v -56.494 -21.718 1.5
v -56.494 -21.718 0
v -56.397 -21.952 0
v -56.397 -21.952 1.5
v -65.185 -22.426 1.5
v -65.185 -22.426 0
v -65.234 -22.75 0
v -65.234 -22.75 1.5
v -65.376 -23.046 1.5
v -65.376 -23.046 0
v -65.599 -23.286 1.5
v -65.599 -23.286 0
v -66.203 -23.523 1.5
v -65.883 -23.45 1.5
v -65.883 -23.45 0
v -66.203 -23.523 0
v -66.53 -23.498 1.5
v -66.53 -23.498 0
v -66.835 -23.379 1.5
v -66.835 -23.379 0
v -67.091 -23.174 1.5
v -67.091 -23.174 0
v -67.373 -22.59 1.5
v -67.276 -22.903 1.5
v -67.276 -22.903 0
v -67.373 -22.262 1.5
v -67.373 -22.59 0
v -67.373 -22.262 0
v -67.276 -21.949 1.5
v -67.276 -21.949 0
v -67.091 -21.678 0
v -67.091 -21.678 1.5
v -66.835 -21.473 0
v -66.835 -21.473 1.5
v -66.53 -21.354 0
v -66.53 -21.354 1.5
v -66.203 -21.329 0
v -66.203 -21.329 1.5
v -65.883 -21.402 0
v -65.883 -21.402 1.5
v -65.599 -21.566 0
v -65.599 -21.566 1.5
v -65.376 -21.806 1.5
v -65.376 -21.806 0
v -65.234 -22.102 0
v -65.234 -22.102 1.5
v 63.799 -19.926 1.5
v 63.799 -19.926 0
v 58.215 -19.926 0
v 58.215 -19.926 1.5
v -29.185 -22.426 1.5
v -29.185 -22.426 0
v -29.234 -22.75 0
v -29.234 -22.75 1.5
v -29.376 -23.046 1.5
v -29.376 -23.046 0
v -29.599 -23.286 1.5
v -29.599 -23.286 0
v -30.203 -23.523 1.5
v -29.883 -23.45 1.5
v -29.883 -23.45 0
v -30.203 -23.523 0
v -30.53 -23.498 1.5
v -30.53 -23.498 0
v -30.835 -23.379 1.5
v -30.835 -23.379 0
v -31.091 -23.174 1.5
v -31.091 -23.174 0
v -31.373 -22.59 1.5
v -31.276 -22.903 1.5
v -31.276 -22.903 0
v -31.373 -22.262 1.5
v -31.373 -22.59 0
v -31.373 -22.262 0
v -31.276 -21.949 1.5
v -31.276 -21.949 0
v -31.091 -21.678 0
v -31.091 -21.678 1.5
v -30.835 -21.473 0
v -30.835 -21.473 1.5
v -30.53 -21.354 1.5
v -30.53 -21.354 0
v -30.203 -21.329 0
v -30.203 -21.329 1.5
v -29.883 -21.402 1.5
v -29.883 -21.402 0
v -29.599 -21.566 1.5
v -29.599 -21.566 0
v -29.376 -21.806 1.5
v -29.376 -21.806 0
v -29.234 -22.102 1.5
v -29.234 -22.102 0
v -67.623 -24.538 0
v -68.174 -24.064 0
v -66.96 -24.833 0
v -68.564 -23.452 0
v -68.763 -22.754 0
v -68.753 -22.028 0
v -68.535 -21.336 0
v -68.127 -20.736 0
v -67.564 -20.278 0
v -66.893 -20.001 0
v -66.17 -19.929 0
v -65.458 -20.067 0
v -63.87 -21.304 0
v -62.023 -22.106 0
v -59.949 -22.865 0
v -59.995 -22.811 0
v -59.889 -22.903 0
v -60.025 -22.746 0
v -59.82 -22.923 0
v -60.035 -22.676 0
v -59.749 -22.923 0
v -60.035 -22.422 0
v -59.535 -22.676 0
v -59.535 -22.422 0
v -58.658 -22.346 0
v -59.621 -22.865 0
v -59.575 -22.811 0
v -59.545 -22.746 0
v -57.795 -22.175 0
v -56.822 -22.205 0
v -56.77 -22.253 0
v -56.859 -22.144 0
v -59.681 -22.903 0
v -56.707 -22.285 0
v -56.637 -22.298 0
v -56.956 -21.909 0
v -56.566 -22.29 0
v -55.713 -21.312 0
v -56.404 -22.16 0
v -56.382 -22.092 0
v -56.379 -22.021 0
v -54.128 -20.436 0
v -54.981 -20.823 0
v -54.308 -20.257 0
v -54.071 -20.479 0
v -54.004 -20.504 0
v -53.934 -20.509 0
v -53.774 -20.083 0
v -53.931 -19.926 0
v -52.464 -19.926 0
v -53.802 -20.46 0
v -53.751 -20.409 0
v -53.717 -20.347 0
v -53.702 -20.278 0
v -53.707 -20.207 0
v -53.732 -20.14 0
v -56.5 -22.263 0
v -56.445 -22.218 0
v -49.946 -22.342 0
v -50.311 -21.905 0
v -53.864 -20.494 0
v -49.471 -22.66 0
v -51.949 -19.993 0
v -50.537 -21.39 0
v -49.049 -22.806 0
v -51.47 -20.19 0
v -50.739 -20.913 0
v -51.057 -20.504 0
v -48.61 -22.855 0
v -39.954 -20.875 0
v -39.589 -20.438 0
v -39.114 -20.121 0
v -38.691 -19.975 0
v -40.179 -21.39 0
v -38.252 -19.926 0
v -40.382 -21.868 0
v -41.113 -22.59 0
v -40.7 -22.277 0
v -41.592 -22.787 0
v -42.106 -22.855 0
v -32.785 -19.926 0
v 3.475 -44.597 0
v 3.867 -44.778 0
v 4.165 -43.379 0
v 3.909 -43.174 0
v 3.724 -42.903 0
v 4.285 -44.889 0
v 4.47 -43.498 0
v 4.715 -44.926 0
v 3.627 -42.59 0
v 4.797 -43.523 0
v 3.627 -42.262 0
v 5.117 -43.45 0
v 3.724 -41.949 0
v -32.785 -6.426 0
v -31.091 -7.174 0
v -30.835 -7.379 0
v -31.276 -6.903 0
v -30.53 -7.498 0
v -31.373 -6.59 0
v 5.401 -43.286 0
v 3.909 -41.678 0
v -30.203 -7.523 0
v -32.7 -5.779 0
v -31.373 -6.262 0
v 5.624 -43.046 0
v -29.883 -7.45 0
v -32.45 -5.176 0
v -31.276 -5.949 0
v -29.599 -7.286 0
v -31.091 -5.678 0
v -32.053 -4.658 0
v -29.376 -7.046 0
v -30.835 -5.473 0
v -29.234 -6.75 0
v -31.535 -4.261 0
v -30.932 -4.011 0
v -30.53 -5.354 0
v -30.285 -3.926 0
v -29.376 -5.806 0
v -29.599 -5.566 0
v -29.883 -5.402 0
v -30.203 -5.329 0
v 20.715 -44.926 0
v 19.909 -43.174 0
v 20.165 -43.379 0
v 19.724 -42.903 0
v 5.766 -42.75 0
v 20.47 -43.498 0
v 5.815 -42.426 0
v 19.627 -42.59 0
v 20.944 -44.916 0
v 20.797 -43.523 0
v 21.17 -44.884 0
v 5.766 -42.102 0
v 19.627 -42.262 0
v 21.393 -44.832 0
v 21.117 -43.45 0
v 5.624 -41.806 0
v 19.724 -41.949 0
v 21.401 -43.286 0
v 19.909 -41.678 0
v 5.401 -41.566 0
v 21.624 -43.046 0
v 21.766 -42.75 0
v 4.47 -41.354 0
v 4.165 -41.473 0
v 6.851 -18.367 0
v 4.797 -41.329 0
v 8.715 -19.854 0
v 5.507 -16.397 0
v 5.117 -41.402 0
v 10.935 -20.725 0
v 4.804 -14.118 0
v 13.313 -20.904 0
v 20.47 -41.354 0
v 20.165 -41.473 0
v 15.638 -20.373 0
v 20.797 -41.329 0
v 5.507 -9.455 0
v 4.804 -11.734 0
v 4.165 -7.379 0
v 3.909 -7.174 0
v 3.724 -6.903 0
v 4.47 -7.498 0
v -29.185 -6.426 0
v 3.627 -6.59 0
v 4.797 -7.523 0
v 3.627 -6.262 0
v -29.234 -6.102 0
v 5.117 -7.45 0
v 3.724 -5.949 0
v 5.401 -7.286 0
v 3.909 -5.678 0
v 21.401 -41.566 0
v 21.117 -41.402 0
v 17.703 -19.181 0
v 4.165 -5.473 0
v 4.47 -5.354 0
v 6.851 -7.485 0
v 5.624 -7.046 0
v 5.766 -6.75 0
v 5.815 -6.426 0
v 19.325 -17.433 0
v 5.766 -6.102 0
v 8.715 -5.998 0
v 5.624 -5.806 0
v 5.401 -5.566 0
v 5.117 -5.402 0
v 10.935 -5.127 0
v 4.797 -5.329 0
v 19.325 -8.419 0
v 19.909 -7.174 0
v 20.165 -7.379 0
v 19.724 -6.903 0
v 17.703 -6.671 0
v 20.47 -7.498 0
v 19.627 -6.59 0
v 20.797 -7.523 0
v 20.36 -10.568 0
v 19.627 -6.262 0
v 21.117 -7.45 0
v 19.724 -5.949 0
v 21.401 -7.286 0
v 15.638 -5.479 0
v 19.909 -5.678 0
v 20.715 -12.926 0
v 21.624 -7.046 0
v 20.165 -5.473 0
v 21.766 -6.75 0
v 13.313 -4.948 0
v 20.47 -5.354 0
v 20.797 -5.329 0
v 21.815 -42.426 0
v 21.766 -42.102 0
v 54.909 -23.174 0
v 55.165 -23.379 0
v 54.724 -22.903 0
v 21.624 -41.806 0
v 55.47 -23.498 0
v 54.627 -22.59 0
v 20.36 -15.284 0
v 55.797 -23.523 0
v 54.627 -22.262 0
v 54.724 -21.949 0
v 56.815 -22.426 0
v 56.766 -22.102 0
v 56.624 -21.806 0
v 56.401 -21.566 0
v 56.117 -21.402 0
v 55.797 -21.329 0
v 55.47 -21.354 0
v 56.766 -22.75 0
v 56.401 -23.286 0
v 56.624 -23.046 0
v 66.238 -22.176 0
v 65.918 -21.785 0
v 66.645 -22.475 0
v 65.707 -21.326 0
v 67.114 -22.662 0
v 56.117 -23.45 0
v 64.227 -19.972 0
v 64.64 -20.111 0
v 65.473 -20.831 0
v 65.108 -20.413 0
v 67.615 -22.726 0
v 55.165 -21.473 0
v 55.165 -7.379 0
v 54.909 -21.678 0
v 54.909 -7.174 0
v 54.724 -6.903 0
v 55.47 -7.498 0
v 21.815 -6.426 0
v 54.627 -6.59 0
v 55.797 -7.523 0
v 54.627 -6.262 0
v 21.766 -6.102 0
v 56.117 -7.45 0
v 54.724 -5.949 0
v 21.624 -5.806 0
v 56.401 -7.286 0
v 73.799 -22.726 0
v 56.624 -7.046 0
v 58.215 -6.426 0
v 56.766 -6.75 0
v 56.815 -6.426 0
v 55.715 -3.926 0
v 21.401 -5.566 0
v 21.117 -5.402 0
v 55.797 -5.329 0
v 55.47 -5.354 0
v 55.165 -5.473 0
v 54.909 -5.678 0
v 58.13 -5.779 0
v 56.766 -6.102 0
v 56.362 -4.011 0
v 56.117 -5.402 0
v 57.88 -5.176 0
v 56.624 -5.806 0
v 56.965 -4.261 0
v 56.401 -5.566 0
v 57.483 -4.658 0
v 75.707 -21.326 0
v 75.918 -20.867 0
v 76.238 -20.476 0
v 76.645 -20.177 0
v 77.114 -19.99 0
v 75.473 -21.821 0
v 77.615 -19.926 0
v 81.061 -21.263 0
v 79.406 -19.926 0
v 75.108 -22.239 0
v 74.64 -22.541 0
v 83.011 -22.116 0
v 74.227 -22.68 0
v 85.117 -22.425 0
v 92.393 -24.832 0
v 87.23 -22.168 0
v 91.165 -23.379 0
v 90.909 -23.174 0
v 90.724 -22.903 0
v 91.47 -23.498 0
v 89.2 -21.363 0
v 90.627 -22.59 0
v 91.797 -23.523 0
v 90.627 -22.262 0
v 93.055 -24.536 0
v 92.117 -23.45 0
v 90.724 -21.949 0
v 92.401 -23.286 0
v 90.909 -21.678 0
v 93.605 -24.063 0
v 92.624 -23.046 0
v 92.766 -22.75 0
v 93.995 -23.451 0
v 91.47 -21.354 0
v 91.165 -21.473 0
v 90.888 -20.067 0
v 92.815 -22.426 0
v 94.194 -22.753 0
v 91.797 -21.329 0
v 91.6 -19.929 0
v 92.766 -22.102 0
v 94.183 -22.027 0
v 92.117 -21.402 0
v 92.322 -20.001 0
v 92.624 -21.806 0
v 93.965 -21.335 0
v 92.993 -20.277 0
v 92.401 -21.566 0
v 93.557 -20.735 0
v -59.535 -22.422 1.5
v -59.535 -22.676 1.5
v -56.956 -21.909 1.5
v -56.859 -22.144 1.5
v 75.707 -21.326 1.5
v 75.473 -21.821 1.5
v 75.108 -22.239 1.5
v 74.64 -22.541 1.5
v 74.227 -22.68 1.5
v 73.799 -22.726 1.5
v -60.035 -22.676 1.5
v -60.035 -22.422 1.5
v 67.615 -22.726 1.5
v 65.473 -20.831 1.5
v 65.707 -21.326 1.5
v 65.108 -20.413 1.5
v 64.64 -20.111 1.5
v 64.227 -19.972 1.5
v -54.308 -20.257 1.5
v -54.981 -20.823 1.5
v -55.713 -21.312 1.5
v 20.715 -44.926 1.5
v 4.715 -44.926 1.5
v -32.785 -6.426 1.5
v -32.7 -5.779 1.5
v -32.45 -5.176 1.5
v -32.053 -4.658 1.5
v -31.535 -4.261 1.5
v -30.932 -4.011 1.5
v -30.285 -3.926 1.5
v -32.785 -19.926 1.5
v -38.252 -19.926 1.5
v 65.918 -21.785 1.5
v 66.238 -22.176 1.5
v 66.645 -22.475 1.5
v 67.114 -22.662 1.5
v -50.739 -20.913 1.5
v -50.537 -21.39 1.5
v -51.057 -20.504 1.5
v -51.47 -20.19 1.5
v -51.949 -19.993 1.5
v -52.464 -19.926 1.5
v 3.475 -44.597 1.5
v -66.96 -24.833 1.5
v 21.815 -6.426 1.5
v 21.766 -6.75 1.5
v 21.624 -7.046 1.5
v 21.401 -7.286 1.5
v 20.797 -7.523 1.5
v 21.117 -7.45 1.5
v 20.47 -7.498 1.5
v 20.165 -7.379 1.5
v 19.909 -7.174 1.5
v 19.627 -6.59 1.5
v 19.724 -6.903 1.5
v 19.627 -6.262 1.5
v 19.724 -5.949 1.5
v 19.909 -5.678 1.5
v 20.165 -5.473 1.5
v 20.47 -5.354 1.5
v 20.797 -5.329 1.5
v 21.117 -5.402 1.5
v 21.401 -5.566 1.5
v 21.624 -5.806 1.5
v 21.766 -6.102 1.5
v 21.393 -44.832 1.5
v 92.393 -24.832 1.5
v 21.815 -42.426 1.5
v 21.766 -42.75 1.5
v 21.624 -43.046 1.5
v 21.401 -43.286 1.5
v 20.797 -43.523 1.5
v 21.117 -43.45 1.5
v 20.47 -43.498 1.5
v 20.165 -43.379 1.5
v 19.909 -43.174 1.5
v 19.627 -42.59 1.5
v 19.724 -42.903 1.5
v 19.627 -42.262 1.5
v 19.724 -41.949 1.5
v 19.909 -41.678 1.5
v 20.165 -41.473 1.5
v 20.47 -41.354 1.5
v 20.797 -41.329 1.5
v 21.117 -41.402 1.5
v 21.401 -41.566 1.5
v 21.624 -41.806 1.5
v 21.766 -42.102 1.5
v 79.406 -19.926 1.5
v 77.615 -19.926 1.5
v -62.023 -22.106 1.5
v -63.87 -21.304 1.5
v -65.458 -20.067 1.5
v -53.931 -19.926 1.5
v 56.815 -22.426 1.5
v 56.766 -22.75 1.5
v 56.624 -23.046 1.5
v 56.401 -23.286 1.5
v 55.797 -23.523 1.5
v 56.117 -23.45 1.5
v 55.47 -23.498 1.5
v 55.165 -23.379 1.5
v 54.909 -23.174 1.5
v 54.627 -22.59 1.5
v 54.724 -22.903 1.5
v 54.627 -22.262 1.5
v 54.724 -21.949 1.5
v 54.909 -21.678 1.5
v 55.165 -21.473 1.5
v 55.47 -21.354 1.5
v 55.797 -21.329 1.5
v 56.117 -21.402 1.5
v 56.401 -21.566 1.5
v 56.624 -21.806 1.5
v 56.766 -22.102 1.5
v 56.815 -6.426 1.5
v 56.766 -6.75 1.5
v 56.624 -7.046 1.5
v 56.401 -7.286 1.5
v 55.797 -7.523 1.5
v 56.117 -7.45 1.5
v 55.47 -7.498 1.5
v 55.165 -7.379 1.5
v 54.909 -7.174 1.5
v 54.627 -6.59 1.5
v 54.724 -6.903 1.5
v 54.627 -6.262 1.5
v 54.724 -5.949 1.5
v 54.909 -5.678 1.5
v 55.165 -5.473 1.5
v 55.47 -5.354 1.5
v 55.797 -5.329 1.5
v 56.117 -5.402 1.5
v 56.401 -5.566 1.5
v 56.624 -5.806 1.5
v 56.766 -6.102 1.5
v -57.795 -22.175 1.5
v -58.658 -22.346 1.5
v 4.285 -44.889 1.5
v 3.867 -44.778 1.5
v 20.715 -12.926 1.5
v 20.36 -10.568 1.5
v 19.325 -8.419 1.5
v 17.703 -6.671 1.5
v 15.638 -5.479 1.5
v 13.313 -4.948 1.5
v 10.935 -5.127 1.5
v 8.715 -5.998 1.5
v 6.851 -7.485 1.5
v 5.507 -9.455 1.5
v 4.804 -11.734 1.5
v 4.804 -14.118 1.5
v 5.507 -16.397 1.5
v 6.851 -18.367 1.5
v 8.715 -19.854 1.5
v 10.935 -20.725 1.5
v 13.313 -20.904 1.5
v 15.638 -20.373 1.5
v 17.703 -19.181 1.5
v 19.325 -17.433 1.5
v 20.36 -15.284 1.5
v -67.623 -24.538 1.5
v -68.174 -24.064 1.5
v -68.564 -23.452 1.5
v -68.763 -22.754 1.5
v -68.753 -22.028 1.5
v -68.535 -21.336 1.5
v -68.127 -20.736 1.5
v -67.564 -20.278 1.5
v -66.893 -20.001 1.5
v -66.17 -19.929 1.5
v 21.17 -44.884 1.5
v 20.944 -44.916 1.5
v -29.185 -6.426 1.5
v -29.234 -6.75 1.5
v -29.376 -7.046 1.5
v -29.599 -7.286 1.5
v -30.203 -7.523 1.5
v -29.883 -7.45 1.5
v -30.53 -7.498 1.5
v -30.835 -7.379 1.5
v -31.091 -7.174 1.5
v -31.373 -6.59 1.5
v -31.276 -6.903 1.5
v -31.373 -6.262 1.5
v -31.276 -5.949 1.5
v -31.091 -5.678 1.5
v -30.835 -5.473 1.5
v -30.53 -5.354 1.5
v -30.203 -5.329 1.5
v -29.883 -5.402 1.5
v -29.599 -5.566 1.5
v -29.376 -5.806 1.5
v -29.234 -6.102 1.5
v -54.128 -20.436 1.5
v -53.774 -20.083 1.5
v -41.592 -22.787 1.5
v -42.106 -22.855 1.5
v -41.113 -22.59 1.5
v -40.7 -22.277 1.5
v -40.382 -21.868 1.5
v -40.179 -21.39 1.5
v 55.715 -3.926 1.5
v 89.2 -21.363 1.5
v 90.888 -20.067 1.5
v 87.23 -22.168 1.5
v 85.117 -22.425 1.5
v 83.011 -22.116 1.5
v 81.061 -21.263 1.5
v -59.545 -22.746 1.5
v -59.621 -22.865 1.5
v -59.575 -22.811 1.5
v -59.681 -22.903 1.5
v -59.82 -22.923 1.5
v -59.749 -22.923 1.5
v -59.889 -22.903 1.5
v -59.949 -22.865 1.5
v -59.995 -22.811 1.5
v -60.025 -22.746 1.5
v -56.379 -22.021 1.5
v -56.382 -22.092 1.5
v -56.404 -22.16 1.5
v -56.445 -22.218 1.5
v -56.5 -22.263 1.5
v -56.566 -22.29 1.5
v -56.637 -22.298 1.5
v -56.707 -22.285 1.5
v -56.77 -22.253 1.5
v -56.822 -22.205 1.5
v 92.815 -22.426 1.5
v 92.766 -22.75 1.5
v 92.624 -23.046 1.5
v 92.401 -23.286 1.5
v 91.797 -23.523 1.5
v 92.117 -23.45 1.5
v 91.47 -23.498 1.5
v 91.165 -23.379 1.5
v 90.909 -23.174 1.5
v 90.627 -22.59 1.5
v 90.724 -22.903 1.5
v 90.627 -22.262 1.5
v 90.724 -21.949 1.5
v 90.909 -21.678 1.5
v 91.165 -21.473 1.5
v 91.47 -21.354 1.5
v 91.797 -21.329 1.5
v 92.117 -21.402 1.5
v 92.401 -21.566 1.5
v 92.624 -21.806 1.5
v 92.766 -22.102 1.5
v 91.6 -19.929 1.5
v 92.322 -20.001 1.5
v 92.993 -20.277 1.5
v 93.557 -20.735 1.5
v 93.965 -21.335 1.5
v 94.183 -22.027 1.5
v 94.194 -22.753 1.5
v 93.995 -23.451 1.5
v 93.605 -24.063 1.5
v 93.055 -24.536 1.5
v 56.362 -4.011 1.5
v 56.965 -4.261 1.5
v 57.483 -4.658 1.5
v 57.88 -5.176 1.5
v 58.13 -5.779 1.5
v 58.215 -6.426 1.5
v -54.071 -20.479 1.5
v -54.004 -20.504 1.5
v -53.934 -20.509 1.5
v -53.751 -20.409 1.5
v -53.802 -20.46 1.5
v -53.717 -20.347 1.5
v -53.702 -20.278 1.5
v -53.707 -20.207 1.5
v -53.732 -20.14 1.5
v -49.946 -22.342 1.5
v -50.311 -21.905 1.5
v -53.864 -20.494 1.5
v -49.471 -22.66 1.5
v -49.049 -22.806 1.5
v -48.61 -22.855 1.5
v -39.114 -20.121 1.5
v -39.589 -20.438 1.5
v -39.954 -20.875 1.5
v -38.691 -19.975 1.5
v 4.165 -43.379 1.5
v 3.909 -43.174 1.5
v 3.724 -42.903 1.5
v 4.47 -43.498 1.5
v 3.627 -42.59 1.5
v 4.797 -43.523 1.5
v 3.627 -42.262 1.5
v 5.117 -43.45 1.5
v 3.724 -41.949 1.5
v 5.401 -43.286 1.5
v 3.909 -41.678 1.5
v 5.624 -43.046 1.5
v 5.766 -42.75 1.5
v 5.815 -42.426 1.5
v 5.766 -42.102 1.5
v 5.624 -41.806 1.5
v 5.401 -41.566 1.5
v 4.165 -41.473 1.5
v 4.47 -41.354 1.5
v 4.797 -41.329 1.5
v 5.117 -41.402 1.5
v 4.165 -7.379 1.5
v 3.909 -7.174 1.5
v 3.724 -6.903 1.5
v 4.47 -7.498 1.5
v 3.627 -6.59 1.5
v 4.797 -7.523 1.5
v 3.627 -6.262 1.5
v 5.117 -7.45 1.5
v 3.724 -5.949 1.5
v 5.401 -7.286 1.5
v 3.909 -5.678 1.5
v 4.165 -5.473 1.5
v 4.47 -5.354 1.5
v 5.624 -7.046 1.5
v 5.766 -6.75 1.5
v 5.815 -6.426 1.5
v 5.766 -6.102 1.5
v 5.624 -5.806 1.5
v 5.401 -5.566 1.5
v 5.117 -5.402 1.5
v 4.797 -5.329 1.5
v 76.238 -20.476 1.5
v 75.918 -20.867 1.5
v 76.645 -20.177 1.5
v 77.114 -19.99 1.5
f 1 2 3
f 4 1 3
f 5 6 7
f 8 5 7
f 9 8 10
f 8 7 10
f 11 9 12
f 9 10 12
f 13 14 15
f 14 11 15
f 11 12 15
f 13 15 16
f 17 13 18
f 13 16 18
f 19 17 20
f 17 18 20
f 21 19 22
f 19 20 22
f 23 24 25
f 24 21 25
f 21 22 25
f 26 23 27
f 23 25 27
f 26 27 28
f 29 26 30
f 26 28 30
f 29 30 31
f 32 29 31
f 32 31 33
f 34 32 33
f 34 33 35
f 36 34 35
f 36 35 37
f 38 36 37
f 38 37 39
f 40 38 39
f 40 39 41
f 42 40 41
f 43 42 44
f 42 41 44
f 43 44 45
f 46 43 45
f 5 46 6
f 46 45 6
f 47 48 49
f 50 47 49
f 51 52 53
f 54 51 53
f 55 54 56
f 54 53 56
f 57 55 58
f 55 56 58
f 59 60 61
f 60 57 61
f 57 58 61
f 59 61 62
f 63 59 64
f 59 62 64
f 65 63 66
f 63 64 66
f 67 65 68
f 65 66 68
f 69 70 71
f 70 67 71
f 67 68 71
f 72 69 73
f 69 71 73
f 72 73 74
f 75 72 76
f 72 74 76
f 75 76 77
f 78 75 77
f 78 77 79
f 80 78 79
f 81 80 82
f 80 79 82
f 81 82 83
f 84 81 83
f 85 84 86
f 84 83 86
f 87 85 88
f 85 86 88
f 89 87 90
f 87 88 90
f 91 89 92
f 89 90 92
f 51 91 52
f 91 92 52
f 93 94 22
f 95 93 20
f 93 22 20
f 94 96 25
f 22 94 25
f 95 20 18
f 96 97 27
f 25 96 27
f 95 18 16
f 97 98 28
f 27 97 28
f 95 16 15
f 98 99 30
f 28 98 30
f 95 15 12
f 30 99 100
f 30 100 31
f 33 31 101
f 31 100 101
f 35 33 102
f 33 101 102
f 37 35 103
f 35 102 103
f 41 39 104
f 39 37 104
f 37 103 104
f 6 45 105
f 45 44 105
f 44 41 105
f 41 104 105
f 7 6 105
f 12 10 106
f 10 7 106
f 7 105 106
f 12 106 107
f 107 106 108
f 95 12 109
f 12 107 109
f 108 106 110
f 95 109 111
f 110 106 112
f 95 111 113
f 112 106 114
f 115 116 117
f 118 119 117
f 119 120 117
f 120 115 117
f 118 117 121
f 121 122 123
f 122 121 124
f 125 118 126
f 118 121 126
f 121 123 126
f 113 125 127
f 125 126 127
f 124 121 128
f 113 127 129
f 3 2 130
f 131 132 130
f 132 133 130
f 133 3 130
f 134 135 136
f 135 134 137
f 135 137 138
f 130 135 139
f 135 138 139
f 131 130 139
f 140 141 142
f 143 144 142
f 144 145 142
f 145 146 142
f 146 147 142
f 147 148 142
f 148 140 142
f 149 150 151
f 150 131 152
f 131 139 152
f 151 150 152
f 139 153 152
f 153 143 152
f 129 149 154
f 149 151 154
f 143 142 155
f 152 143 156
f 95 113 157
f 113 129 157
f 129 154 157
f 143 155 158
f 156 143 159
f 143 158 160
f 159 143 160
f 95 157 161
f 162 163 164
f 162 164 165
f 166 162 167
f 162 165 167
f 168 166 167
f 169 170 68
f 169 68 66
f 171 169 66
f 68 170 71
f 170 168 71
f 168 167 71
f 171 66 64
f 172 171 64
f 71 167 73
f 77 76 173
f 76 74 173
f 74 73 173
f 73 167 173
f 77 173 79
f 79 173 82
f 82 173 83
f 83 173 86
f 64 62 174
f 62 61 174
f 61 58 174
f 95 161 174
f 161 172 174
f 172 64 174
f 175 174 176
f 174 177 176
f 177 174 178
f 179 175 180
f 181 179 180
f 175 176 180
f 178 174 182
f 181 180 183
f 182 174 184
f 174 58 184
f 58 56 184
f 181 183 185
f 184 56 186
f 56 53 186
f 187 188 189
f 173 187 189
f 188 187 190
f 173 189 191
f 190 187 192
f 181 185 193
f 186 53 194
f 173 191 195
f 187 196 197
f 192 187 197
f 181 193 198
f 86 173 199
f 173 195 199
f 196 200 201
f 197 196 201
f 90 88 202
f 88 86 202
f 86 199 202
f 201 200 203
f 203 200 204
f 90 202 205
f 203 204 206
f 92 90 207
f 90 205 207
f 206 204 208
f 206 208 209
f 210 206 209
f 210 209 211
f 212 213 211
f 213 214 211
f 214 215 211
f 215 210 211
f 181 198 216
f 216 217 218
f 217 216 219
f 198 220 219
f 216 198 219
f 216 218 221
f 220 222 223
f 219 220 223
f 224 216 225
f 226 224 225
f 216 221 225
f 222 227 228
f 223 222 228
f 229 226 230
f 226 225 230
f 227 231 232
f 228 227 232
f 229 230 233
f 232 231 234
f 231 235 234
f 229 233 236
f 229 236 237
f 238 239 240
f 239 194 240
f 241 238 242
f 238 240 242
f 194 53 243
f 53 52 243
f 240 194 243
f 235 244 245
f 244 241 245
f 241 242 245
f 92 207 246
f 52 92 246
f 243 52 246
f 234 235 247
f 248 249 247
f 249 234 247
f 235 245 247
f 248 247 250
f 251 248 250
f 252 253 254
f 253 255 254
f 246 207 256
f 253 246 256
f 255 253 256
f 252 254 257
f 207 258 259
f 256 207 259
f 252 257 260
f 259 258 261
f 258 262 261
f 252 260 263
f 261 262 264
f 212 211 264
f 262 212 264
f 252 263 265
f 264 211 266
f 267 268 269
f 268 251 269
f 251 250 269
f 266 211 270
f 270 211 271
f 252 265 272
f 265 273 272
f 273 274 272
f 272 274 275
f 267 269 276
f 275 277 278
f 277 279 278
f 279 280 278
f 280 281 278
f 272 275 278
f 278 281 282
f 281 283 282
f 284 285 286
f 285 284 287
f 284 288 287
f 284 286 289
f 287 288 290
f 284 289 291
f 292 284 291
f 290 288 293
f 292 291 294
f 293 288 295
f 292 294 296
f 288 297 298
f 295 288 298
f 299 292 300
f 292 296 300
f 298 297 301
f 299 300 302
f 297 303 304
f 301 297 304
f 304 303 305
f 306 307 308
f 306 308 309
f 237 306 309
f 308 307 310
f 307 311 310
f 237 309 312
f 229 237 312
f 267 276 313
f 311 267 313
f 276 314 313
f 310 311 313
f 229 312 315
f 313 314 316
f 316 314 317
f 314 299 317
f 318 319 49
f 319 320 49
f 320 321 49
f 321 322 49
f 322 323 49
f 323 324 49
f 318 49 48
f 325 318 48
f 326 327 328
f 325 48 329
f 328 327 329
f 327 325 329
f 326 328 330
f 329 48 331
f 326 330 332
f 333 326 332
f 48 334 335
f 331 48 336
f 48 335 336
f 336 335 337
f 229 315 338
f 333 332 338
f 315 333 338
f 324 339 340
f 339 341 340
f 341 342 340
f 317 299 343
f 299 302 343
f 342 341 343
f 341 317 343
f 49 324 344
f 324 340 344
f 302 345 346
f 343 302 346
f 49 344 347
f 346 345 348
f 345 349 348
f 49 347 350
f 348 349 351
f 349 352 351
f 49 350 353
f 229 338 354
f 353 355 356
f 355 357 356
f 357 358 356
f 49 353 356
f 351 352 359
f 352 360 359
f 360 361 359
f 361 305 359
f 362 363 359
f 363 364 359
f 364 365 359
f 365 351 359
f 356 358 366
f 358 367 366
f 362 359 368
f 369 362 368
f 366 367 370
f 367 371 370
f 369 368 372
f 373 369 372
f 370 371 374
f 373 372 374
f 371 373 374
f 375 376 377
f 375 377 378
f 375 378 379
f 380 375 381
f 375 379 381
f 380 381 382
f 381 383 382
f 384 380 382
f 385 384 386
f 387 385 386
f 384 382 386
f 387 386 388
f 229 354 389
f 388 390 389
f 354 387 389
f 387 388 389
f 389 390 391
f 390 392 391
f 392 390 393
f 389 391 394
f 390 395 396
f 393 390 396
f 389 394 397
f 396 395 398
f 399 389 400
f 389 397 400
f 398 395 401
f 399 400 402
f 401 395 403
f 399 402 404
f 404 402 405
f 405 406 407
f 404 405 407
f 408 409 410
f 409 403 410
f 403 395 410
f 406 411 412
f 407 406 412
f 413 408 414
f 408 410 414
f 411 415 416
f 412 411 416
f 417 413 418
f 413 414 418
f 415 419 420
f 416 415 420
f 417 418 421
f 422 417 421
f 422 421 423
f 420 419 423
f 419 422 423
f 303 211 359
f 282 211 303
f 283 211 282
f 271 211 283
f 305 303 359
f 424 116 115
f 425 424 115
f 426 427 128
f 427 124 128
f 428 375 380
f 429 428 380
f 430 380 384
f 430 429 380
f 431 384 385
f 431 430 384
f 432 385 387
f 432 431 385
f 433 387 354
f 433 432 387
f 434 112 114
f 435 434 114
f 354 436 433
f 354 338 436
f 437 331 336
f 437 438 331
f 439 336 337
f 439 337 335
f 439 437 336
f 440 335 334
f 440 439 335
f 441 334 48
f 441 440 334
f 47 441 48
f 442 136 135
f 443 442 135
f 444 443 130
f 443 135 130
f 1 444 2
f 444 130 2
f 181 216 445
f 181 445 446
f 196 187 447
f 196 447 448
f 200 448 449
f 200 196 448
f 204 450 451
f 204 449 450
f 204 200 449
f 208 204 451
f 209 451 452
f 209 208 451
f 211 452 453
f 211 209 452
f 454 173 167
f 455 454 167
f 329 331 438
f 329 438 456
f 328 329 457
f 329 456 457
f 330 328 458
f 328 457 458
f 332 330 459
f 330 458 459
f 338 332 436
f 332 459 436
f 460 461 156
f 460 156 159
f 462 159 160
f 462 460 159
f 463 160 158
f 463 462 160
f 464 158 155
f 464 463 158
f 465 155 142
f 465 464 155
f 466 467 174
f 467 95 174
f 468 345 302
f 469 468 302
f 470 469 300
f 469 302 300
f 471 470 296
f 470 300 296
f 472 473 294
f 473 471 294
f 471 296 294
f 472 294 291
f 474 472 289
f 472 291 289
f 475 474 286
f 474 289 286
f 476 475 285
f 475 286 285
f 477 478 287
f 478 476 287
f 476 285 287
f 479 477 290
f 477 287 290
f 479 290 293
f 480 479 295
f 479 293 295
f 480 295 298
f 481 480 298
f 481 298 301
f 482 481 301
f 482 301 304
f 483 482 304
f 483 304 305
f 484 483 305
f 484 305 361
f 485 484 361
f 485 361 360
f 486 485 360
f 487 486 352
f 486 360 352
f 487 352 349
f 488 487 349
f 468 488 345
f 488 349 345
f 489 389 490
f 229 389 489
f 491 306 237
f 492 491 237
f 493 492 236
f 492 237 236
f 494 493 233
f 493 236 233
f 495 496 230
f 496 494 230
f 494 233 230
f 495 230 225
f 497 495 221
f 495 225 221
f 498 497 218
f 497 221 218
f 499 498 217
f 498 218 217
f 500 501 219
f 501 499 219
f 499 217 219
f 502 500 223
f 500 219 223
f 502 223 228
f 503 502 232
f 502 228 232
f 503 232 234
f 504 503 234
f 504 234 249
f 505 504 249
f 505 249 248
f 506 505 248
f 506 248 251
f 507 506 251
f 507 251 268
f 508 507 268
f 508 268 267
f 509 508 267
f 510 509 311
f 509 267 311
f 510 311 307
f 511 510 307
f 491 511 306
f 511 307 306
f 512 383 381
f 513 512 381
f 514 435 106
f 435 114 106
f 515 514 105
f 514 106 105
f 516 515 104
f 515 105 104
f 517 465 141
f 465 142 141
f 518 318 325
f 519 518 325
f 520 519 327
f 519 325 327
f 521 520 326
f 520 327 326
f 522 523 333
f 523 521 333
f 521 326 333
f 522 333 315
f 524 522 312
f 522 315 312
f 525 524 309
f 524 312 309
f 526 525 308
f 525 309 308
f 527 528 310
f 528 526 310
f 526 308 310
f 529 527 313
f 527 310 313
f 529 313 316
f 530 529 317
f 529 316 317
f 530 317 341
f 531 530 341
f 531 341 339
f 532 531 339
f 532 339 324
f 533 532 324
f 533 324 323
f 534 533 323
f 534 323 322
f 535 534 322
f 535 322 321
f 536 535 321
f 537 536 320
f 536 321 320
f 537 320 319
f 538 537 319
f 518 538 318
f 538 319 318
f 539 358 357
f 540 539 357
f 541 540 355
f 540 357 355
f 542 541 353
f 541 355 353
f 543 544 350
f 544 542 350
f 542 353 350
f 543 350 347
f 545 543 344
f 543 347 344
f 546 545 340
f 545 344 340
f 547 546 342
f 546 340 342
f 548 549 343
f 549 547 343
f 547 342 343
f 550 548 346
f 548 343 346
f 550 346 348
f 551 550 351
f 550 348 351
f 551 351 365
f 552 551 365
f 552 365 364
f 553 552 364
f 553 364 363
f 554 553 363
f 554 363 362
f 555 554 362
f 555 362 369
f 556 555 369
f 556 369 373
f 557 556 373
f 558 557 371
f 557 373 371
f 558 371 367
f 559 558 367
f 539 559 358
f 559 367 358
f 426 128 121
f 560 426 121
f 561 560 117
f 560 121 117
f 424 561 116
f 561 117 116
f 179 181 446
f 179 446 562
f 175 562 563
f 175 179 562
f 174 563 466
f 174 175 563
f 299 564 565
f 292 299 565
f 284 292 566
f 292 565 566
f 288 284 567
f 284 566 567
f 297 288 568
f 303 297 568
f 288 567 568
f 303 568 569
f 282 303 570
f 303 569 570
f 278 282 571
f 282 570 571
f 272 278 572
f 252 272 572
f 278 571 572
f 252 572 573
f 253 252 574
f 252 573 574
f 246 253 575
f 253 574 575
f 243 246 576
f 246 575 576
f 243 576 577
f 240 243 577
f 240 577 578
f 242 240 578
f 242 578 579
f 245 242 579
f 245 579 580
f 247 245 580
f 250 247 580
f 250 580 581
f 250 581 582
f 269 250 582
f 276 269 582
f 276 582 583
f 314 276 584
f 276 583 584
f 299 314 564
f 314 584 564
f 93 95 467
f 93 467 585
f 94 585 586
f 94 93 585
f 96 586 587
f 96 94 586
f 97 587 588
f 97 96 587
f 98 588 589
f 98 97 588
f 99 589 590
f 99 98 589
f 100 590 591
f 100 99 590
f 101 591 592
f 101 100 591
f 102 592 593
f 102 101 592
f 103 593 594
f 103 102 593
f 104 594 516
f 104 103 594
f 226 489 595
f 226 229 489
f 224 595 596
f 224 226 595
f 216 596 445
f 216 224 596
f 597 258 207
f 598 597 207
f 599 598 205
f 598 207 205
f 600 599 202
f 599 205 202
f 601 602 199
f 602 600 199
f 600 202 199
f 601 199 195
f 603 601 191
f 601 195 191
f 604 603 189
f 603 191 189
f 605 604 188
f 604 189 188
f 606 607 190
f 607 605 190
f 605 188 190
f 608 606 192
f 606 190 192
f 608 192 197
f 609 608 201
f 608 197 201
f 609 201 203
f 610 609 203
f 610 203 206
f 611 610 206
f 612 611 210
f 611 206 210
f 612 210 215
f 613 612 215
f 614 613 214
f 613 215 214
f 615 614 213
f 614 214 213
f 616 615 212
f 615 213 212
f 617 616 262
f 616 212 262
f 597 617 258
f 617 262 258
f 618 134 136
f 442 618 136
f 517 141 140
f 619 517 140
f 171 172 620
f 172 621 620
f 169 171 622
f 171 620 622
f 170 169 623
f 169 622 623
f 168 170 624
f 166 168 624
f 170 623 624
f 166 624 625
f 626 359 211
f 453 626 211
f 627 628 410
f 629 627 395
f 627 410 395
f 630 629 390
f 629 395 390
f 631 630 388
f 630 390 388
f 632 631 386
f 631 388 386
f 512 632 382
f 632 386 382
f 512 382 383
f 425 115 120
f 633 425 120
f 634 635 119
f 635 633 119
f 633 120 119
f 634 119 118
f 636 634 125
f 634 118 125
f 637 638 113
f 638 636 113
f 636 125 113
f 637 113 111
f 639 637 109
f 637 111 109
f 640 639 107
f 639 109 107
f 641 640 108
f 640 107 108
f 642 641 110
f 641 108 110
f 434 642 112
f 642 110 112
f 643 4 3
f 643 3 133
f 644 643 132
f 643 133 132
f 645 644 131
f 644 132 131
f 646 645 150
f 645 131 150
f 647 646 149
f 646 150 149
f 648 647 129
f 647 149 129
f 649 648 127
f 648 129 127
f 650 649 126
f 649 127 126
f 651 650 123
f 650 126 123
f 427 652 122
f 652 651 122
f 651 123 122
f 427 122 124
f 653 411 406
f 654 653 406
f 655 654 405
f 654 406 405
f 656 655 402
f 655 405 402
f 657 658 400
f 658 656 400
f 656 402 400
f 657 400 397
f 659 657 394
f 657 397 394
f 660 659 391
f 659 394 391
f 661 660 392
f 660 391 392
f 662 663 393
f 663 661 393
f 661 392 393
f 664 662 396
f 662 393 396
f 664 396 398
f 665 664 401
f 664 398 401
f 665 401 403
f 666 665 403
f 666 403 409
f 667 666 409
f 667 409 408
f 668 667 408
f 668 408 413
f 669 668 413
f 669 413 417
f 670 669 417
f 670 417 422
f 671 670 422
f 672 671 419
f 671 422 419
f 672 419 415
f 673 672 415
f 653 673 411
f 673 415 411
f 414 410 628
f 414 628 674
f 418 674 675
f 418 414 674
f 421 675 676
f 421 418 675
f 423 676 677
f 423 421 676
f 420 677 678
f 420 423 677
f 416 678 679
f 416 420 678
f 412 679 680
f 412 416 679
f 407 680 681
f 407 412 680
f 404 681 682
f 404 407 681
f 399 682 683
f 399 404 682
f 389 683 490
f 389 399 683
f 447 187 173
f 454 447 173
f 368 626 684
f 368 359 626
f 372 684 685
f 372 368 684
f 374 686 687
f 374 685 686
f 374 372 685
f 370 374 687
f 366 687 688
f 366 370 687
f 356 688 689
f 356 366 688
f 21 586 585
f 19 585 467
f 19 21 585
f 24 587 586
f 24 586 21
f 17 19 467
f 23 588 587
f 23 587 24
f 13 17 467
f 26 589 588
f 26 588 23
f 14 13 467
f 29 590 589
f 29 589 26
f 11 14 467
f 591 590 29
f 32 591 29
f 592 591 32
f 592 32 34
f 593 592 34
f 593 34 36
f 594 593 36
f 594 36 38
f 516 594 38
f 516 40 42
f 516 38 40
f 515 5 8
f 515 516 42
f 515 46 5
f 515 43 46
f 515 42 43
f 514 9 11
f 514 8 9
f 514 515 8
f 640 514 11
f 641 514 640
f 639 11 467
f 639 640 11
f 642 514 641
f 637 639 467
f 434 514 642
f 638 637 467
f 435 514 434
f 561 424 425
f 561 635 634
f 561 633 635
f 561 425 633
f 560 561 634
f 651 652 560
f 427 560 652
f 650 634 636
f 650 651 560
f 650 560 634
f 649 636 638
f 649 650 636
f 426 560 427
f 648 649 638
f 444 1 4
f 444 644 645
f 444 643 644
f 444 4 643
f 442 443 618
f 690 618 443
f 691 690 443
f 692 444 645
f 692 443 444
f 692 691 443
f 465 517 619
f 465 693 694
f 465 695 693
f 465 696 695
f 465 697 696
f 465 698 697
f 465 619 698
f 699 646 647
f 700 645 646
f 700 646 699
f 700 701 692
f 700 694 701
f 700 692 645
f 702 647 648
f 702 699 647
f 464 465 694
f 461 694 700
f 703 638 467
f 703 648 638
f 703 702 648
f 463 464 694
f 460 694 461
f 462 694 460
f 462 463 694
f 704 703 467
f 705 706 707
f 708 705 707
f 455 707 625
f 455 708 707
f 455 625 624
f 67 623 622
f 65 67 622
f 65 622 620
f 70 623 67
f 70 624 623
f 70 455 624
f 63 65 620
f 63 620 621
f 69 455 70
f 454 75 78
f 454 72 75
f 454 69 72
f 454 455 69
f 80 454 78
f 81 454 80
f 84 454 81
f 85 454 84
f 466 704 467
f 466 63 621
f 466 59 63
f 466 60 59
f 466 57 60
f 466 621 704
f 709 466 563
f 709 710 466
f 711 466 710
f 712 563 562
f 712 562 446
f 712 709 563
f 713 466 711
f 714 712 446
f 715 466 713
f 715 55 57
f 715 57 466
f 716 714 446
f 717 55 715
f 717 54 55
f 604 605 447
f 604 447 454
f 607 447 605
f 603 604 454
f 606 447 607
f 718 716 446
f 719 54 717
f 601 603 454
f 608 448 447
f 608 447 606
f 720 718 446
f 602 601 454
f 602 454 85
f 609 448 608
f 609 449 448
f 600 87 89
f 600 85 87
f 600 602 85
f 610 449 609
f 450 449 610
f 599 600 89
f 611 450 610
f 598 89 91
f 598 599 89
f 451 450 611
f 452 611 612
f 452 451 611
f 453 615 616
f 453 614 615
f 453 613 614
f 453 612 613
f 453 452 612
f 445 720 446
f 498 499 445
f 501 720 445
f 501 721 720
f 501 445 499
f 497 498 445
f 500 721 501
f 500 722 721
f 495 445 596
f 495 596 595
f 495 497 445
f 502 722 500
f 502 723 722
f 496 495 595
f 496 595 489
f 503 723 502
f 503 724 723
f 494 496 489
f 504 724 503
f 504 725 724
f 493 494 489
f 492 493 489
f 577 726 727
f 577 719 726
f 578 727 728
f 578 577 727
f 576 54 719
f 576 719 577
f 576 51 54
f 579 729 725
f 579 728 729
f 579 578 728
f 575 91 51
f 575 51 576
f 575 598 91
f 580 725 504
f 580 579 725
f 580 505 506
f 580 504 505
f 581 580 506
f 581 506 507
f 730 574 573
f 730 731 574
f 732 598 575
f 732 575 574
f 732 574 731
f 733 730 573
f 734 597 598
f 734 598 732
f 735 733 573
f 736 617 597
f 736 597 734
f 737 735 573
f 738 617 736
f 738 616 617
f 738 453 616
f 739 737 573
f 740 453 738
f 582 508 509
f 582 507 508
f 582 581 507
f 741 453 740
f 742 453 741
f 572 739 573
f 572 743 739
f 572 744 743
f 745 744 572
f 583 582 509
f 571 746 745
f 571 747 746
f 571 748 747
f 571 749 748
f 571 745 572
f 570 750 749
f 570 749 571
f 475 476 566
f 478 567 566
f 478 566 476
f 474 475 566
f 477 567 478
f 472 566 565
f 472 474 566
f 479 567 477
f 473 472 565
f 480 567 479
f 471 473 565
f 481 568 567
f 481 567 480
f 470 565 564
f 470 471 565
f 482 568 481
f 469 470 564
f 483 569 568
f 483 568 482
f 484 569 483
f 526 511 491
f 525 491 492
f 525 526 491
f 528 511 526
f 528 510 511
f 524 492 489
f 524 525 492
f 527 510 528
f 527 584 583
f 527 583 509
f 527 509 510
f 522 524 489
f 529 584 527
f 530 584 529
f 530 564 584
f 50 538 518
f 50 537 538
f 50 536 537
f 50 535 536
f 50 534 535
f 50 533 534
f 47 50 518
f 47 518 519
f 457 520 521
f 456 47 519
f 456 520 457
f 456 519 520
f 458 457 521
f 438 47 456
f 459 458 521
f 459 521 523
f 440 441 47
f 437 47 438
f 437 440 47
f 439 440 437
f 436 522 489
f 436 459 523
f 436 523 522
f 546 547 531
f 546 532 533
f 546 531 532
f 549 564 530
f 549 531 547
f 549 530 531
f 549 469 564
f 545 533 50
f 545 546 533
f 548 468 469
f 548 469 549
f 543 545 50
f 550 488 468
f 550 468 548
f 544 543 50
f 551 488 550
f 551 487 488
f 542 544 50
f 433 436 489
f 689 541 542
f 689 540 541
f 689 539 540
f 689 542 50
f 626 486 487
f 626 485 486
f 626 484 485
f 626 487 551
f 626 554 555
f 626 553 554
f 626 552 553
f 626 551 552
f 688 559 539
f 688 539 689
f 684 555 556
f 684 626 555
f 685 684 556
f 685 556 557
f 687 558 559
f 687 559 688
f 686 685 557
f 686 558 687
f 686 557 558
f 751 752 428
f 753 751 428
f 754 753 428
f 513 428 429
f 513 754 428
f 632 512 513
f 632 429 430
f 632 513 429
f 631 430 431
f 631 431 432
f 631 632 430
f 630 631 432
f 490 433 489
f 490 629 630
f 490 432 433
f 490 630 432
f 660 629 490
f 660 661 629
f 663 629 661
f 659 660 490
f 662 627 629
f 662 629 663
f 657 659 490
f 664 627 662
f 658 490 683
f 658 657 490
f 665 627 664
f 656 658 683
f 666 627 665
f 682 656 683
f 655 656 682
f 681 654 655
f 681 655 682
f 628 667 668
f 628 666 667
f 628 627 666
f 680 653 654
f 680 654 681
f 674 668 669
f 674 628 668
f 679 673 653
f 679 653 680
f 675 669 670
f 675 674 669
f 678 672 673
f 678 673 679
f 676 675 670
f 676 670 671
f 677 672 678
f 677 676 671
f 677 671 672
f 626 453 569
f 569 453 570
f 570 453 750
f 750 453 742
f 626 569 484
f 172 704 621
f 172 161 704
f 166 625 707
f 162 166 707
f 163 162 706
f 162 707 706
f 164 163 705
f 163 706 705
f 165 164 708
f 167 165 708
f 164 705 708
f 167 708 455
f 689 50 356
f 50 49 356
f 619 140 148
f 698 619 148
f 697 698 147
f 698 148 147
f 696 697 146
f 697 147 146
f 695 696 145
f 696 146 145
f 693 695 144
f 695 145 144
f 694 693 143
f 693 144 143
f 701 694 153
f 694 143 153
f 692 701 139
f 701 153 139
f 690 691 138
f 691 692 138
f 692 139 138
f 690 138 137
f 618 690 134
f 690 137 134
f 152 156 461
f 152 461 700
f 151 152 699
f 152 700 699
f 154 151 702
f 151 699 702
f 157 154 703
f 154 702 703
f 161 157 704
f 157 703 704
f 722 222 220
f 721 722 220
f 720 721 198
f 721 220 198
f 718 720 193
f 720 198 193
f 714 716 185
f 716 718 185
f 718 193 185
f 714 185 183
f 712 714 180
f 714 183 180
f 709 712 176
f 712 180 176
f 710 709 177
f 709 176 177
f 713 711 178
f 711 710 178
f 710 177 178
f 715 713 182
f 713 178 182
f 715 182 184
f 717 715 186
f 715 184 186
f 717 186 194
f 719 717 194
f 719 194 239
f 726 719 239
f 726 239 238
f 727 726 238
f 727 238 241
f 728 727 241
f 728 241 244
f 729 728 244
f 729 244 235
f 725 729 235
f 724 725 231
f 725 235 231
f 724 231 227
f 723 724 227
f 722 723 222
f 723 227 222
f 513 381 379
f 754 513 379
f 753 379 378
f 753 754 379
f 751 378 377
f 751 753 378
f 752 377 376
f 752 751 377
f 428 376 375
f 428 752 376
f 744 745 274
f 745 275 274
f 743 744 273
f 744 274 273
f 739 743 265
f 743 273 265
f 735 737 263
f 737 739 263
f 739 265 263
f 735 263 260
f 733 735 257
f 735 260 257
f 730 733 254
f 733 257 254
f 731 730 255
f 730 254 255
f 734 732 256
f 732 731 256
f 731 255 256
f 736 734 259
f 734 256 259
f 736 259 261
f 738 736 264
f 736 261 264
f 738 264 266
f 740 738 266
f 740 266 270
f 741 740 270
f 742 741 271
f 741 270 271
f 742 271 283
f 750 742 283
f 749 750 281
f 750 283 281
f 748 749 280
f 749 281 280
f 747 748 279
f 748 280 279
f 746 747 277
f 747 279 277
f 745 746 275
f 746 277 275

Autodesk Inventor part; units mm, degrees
ref_plane "YZ Plane" through (0, 0, 0) normal (1, 0, 0) x (0, 1, 0)
ref_plane "XZ Plane" through (0, 0, 0) normal (0, 1, 0) x (-1, 0, 0)
ref_plane "XY Plane" through (0, 0, 0) normal (0, 0, 1) x (1, 0, 0)
sketch "スケッチ1" plane through (0, 0, 0) normal (0, 0, 1) x (1, 0, 0)
  circle A0 centre (55.7151, -22.426) radius 1 projected
  circle A1 centre (55.7151, -6.426) radius 1.05 projected
  circle A2 centre (20.7151, -6.426) radius 1 projected
  circle A3 centre (4.7151, -6.426) radius 1.45 projected
  circle A4 centre (-30.2849, -22.426) radius 1 projected
  circle A5 centre (-30.2849, -6.426) radius 1.05 projected
  circle A6 centre (55.7151, -22.426) radius 1.1
  circle A7 centre (55.7151, -6.426) radius 1.1
  circle A8 centre (20.7151, -6.426) radius 1.1
  circle A9 centre (4.7151, -6.426) radius 1.1
  circle A10 centre (-30.2849, -6.426) radius 1.1
  circle A11 centre (-30.2849, -22.426) radius 1.1
  circle A12 centre (20.7151, -42.426) radius 1 projected
  circle A13 centre (4.7151, -42.426) radius 1 projected
  circle A14 centre (20.7151, -42.426) radius 1.1
  circle A15 centre (4.7151, -42.426) radius 1.1
  circle A16 centre (55.7151, -6.426) radius 2.5
  circle A17 centre (-30.2849, -6.426) radius 2.5
  circle A18 centre (-30.2849, -22.426) radius 2.5
  circle A19 centre (55.7151, -22.426) radius 2.5
  circle A20 centre (20.7151, -42.426) radius 2.5
  circle A21 centre (4.7151, -42.426) radius 2.5
  line L0 (21.9554, -44.5966) -> (56.9554, -24.5966)
  line L1 (58.2151, -22.426) -> (58.2151, -6.426)
  line L2 (55.7151, -3.926) -> (-30.2849, -3.926)
  line L3 (-32.7849, -6.426) -> (-32.7849, -22.426)
  line L4 (3.4747, -44.5966) -> (-31.5253, -24.5966)
  line L5 (20.7151, -44.926) -> (4.7151, -44.926)
  circle A22 centre (91.7151, -22.426) radius 1 projected
  circle A23 centre (91.7151, -22.426) radius 1.1
  circle A24 centre (-66.2849, -22.426) radius 1.05 projected
  circle A25 centre (-66.2849, -22.426) radius 1.1
  circle A26 centre (-66.2849, -22.426) radius 2.5
  circle A27 centre (91.7151, -22.426) radius 2.5
  line L6 (92.3929, -24.8324) -> (21.3929, -44.8324)
  line L7 (91.7151, -19.926) -> (55.7151, -19.926)
  line L8 (73.8937, -20.8546) -> (67.5365, -20.8546) projected
  line L9 (73.8937, -16.9974) -> (73.8937, -20.8546) projected
  line L10 (67.5365, -16.9974) -> (73.8937, -16.9974) projected
  line L11 (67.5365, -20.8546) -> (67.5365, -16.9974) projected
  line L12 (73.8937, -20.8546) -> (67.5365, -20.8546) projected
  line L13 (67.6151, -17.226) -> (73.6151, -17.226) projected
  line L14 (73.6151, -17.226) -> (73.6151, -20.726) projected
  line L15 (73.6151, -20.726) -> (67.6151, -20.726) projected
  line L16 (67.6151, -20.726) -> (67.6151, -17.226) projected
  line L17 (65.6151, -22.726) -> (75.6151, -22.726)
  line L18 (75.6151, -22.726) -> (75.6151, -15.226)
  line L19 (75.6151, -15.226) -> (65.6151, -15.226)
  line L20 (65.6151, -15.226) -> (65.6151, -22.726)
  line L21 (-66.9603, -24.833) -> (3.4747, -44.5966)
  line L22 (-30.2849, -19.926) -> (-66.2849, -19.926)
  line L23 (-48.4635, -20.8546) -> (-48.4635, -16.9974) projected
  line L24 (-28.7849, -24.426) -> (-67.7849, -24.426) projected
  arc A28 (-28.7849, -24.426) -> (-28.2849, -23.926) centre (-28.7849, -23.926) ccw projected
  line L25 (-28.2849, -4.926) -> (-28.2849, -23.926) projected
  arc A29 (-28.2849, -4.926) -> (-28.7849, -4.426) centre (-28.7849, -4.926) ccw projected
  line L26 (-67.7849, -4.426) -> (-28.7849, -4.426) projected
  arc A30 (-67.7849, -4.426) -> (-68.2849, -4.926) centre (-67.7849, -4.926) ccw projected
  line L27 (-68.2849, -23.926) -> (-68.2849, -4.926) projected
  arc A31 (-68.2849, -23.926) -> (-67.7849, -24.426) centre (-67.7849, -23.926) ccw projected
  line L28 (-48.4635, -7.9974) -> (-42.1063, -7.9974) projected
  line L29 (-42.1063, -7.9974) -> (-42.1063, -11.8546) projected
  line L30 (-42.1063, -11.8546) -> (-48.4635, -11.8546) projected
  line L31 (-48.4635, -11.8546) -> (-48.4635, -7.9974) projected
  circle A32 centre (-40.8849, -14.426) radius 1.1519 projected
  line L32 (-48.4635, -20.8546) -> (-48.4635, -16.9974) projected
  line L33 (-48.4635, -16.9974) -> (-42.1063, -16.9974) projected
  line L34 (-42.1063, -16.9974) -> (-42.1063, -20.8546) projected
  line L35 (-42.1063, -20.8546) -> (-48.4635, -20.8546) projected
  circle A33 centre (-66.2849, -6.426) radius 1.8131 projected
  circle A34 centre (-66.2849, -22.426) radius 1.8131 projected
  circle A35 centre (-30.2849, -6.426) radius 1.8131 projected
  circle A36 centre (-30.2849, -22.426) radius 1.8131 projected
  arc A37 (-59.7956, -8.176) -> (-59.7849, -20.676) centre (-59.7849, -14.426) ccw projected
  arc A38 (-60.0349, -7.926) -> (-59.7956, -8.1758) centre (-59.7849, -7.926) ccw projected
  line L36 (-60.0349, -7.926) -> (-60.0349, -6.176) projected
  arc A39 (-59.5349, -6.176) -> (-60.0349, -6.176) centre (-59.7849, -6.176) ccw projected
  line L37 (-59.5349, -6.176) -> (-59.5349, -7.926) projected
  arc A40 (-59.7849, -8.176) -> (-59.5349, -7.926) centre (-59.7849, -7.926) ccw projected
  arc A41 (-57.3931, -8.6518) -> (-59.7849, -8.176) centre (-59.7849, -14.426) ccw projected
  arc A42 (-57.5284, -8.3251) -> (-57.3931, -8.6518) centre (-57.2975, -8.4208) ccw projected
  line L38 (-57.5284, -8.3251) -> (-56.8587, -6.7083) projected
  arc A43 (-56.3968, -6.8997) -> (-56.8587, -6.7083) centre (-56.6278, -6.804) ccw projected
  line L39 (-56.3968, -6.8997) -> (-57.0665, -8.5165) projected
  arc A44 (-57.3931, -8.6518) -> (-57.0665, -8.5165) centre (-57.2975, -8.4208) ccw projected
  arc A45 (-55.3655, -10.0066) -> (-57.3931, -8.6518) centre (-59.7849, -14.426) ccw projected
  arc A46 (-55.3655, -9.653) -> (-55.3655, -10.0066) centre (-55.1887, -9.8298) ccw projected
  line L40 (-55.3655, -9.653) -> (-54.1281, -8.4156) projected
  arc A47 (-53.7745, -8.7692) -> (-54.1281, -8.4156) centre (-53.9513, -8.5924) ccw projected
  line L41 (-53.7745, -8.7692) -> (-55.0119, -10.0066) projected
  arc A48 (-55.3655, -10.0066) -> (-55.0119, -10.0066) centre (-55.1887, -9.8298) ccw projected
  arc A49 (-54.0107, -12.0342) -> (-55.3655, -10.0066) centre (-59.7849, -14.426) ccw projected
  arc A50 (-53.8754, -11.7076) -> (-54.0107, -12.0342) centre (-53.7797, -11.9386) ccw projected
  line L42 (-53.8754, -11.7076) -> (-52.2586, -11.0379) projected
  arc A51 (-52.0672, -11.4998) -> (-52.2586, -11.0379) centre (-52.1629, -11.2689) ccw projected
  line L43 (-52.0672, -11.4998) -> (-53.684, -12.1695) projected
  arc A52 (-54.0107, -12.0342) -> (-53.684, -12.1695) centre (-53.7797, -11.9386) ccw projected
  arc A53 (-53.5349, -14.426) -> (-54.0107, -12.0342) centre (-59.7849, -14.426) ccw projected
  arc A54 (-53.2849, -14.176) -> (-53.5349, -14.426) centre (-53.2849, -14.426) ccw projected
  line L44 (-53.2849, -14.176) -> (-51.5349, -14.176) projected
  arc A55 (-51.5349, -14.676) -> (-51.5349, -14.176) centre (-51.5349, -14.426) ccw projected
  line L45 (-51.5349, -14.676) -> (-53.2849, -14.676) projected
  arc A56 (-53.5349, -14.426) -> (-53.2849, -14.676) centre (-53.2849, -14.426) ccw projected
  arc A57 (-54.0107, -16.8178) -> (-53.5349, -14.426) centre (-59.7849, -14.426) ccw projected
  arc A58 (-53.684, -16.6825) -> (-54.0107, -16.8178) centre (-53.7797, -16.9134) ccw projected
  line L46 (-53.684, -16.6825) -> (-52.0672, -17.3522) projected
  arc A59 (-52.2586, -17.8141) -> (-52.0672, -17.3522) centre (-52.1629, -17.5831) ccw projected
  line L47 (-52.2586, -17.8141) -> (-53.8754, -17.1444) projected
  arc A60 (-54.0107, -16.8178) -> (-53.8754, -17.1444) centre (-53.7797, -16.9134) ccw projected
  arc A61 (-55.3655, -18.8454) -> (-54.0107, -16.8178) centre (-59.7849, -14.426) ccw projected
  arc A62 (-55.0119, -18.8454) -> (-55.3655, -18.8454) centre (-55.1887, -19.0222) ccw projected
  line L48 (-55.0119, -18.8454) -> (-53.7745, -20.0829) projected
  arc A63 (-54.1281, -20.4364) -> (-53.7745, -20.0829) centre (-53.9513, -20.2596) ccw projected
  line L49 (-54.1281, -20.4364) -> (-55.3655, -19.199) projected
  arc A64 (-55.3655, -18.8454) -> (-55.3655, -19.199) centre (-55.1887, -19.0222) ccw projected
  arc A65 (-57.3931, -20.2003) -> (-55.3655, -18.8454) centre (-59.7849, -14.426) ccw projected
  arc A66 (-57.0665, -20.3356) -> (-57.3931, -20.2003) centre (-57.2975, -20.4312) ccw projected
  line L50 (-57.0665, -20.3356) -> (-56.3968, -21.9523) projected
  arc A67 (-56.8587, -22.1437) -> (-56.3968, -21.9523) centre (-56.6278, -22.048) ccw projected
  line L51 (-56.8587, -22.1437) -> (-57.5284, -20.5269) projected
  arc A68 (-57.3931, -20.2003) -> (-57.5284, -20.5269) centre (-57.2975, -20.4312) ccw projected
  arc A69 (-59.7849, -20.676) -> (-57.3931, -20.2003) centre (-59.7849, -14.426) ccw projected
  arc A70 (-59.5349, -20.926) -> (-59.7849, -20.676) centre (-59.7849, -20.926) ccw projected
  line L52 (-59.5349, -20.926) -> (-59.5349, -22.676) projected
  arc A71 (-60.0349, -22.676) -> (-59.5349, -22.676) centre (-59.7849, -22.676) ccw projected
  line L53 (-60.0349, -22.676) -> (-60.0349, -20.926) projected
  arc A72 (-59.7849, -20.676) -> (-60.0349, -20.926) centre (-59.7849, -20.926) ccw projected
  line L54 (-50.4635, -22.8546) -> (-40.1063, -22.8546)
  line L55 (-40.1063, -22.8546) -> (-40.1063, -14.9974)
  line L56 (-40.1063, -14.9974) -> (-50.4635, -14.9974)
  line L57 (-50.4635, -22.8546) -> (-50.4635, -14.9974)
  circle A73 centre (-59.7849, -14.426) radius 8 projected
  circle A74 centre (85.2151, -14.426) radius 8 projected
  point P0 (0, 0)
  point P1 (-32.7849, -19.926)
  point P2 (-40.1063, -19.926)
  point P3 (-50.4635, -19.926)
  point P4 (-53.9314, -19.926)
  point P5 (-54.3076, -20.2569)
  point P6 (-56.494, -21.7178)
  point P7 (-56.9559, -21.9091)
  point P8 (-59.5349, -22.4221)
  point P9 (-60.0349, -22.4221)
  point P10 (-65.4578, -20.0668)
  point P11 (65.6151, -19.926)
  point P12 (58.2151, -19.926)
  point P13 (90.888, -20.0668)
  point P14 (79.4056, -19.926)
  point P15 (75.6151, -19.926)
  dimension "d0" = 2.2
  dimension "d1" = 2.2
  dimension "d2" = 2.2
  dimension "d3" = 2.2
  dimension "d4" = 2.2
  dimension "d5" = 2.2
  dimension "d6" = 2.2
  dimension "d7" = 2.2
  dimension "d8" = 5
  dimension "d9" = 5
  dimension "d10" = 5
  dimension "d11" = 5
  dimension "d12" = 5
  dimension "d13" = 5
  dimension "d18" = 2.2
  dimension "d19" = 2.2
  dimension "d20" = 5
  dimension "d21" = 5
  dimension "d22" = 2
  dimension "d23" = 2
  dimension "d24" = 2
extrude "押し出し1" add sketch "スケッチ1" along normal blind 1.5 contours A3 | A16 | L1 L7 A19 L0 A20 L5 A21 L4 A18 A28 L25 A17 A29 L2 A16 | L7 L20 L17 L18 A74 A27 L6 A20 L0 A19 L1 | L1 A19 L7 | A17 L26 | A19 | A29 A17 | A17 L25 L26 | A17 L25 | A17 L25 A18 L22 L3 | A20 | L22 A18 L3 | L3 A18 L24 A26 A73 L53 A71 L52 L51 A67 L50 L49 A63 L48 L22 L57 L54 L55 | L25 A18 L24 | A18 L25 | L27 A26 | A26 A73 L24 L27 | A27 A74 | A28 A18 | L24 A18 | A18 L4 L21 A26 L24 | A21 | A26 L24 | A34 | A35 | A36 picked at (89.8821, -21.5749)
sketch "スケッチ2" plane through (0, 0, 1.5) normal (0, 0, 1) x (1, 0, 0)
  circle A0 centre (12.7151, -12.926) radius 8 projected
  point P0 (0, 0)
extrude "押し出し2" cut sketch "スケッチ2" against normal through all
fillet "フィレット1" radius 2 8 edges at (75.6151, -19.926, 0.75) (75.6151, -22.726, 0.75) (65.6151, -22.726, 0.75) (65.6151, -19.926, 0.75) (-50.4635, -19.926, 0.75) (-50.4635, -22.8546, 0.75) (-40.1063, -22.8546, 0.75) (-40.1063, -19.926, 0.75)
properties part number "jouhansin_sita"
